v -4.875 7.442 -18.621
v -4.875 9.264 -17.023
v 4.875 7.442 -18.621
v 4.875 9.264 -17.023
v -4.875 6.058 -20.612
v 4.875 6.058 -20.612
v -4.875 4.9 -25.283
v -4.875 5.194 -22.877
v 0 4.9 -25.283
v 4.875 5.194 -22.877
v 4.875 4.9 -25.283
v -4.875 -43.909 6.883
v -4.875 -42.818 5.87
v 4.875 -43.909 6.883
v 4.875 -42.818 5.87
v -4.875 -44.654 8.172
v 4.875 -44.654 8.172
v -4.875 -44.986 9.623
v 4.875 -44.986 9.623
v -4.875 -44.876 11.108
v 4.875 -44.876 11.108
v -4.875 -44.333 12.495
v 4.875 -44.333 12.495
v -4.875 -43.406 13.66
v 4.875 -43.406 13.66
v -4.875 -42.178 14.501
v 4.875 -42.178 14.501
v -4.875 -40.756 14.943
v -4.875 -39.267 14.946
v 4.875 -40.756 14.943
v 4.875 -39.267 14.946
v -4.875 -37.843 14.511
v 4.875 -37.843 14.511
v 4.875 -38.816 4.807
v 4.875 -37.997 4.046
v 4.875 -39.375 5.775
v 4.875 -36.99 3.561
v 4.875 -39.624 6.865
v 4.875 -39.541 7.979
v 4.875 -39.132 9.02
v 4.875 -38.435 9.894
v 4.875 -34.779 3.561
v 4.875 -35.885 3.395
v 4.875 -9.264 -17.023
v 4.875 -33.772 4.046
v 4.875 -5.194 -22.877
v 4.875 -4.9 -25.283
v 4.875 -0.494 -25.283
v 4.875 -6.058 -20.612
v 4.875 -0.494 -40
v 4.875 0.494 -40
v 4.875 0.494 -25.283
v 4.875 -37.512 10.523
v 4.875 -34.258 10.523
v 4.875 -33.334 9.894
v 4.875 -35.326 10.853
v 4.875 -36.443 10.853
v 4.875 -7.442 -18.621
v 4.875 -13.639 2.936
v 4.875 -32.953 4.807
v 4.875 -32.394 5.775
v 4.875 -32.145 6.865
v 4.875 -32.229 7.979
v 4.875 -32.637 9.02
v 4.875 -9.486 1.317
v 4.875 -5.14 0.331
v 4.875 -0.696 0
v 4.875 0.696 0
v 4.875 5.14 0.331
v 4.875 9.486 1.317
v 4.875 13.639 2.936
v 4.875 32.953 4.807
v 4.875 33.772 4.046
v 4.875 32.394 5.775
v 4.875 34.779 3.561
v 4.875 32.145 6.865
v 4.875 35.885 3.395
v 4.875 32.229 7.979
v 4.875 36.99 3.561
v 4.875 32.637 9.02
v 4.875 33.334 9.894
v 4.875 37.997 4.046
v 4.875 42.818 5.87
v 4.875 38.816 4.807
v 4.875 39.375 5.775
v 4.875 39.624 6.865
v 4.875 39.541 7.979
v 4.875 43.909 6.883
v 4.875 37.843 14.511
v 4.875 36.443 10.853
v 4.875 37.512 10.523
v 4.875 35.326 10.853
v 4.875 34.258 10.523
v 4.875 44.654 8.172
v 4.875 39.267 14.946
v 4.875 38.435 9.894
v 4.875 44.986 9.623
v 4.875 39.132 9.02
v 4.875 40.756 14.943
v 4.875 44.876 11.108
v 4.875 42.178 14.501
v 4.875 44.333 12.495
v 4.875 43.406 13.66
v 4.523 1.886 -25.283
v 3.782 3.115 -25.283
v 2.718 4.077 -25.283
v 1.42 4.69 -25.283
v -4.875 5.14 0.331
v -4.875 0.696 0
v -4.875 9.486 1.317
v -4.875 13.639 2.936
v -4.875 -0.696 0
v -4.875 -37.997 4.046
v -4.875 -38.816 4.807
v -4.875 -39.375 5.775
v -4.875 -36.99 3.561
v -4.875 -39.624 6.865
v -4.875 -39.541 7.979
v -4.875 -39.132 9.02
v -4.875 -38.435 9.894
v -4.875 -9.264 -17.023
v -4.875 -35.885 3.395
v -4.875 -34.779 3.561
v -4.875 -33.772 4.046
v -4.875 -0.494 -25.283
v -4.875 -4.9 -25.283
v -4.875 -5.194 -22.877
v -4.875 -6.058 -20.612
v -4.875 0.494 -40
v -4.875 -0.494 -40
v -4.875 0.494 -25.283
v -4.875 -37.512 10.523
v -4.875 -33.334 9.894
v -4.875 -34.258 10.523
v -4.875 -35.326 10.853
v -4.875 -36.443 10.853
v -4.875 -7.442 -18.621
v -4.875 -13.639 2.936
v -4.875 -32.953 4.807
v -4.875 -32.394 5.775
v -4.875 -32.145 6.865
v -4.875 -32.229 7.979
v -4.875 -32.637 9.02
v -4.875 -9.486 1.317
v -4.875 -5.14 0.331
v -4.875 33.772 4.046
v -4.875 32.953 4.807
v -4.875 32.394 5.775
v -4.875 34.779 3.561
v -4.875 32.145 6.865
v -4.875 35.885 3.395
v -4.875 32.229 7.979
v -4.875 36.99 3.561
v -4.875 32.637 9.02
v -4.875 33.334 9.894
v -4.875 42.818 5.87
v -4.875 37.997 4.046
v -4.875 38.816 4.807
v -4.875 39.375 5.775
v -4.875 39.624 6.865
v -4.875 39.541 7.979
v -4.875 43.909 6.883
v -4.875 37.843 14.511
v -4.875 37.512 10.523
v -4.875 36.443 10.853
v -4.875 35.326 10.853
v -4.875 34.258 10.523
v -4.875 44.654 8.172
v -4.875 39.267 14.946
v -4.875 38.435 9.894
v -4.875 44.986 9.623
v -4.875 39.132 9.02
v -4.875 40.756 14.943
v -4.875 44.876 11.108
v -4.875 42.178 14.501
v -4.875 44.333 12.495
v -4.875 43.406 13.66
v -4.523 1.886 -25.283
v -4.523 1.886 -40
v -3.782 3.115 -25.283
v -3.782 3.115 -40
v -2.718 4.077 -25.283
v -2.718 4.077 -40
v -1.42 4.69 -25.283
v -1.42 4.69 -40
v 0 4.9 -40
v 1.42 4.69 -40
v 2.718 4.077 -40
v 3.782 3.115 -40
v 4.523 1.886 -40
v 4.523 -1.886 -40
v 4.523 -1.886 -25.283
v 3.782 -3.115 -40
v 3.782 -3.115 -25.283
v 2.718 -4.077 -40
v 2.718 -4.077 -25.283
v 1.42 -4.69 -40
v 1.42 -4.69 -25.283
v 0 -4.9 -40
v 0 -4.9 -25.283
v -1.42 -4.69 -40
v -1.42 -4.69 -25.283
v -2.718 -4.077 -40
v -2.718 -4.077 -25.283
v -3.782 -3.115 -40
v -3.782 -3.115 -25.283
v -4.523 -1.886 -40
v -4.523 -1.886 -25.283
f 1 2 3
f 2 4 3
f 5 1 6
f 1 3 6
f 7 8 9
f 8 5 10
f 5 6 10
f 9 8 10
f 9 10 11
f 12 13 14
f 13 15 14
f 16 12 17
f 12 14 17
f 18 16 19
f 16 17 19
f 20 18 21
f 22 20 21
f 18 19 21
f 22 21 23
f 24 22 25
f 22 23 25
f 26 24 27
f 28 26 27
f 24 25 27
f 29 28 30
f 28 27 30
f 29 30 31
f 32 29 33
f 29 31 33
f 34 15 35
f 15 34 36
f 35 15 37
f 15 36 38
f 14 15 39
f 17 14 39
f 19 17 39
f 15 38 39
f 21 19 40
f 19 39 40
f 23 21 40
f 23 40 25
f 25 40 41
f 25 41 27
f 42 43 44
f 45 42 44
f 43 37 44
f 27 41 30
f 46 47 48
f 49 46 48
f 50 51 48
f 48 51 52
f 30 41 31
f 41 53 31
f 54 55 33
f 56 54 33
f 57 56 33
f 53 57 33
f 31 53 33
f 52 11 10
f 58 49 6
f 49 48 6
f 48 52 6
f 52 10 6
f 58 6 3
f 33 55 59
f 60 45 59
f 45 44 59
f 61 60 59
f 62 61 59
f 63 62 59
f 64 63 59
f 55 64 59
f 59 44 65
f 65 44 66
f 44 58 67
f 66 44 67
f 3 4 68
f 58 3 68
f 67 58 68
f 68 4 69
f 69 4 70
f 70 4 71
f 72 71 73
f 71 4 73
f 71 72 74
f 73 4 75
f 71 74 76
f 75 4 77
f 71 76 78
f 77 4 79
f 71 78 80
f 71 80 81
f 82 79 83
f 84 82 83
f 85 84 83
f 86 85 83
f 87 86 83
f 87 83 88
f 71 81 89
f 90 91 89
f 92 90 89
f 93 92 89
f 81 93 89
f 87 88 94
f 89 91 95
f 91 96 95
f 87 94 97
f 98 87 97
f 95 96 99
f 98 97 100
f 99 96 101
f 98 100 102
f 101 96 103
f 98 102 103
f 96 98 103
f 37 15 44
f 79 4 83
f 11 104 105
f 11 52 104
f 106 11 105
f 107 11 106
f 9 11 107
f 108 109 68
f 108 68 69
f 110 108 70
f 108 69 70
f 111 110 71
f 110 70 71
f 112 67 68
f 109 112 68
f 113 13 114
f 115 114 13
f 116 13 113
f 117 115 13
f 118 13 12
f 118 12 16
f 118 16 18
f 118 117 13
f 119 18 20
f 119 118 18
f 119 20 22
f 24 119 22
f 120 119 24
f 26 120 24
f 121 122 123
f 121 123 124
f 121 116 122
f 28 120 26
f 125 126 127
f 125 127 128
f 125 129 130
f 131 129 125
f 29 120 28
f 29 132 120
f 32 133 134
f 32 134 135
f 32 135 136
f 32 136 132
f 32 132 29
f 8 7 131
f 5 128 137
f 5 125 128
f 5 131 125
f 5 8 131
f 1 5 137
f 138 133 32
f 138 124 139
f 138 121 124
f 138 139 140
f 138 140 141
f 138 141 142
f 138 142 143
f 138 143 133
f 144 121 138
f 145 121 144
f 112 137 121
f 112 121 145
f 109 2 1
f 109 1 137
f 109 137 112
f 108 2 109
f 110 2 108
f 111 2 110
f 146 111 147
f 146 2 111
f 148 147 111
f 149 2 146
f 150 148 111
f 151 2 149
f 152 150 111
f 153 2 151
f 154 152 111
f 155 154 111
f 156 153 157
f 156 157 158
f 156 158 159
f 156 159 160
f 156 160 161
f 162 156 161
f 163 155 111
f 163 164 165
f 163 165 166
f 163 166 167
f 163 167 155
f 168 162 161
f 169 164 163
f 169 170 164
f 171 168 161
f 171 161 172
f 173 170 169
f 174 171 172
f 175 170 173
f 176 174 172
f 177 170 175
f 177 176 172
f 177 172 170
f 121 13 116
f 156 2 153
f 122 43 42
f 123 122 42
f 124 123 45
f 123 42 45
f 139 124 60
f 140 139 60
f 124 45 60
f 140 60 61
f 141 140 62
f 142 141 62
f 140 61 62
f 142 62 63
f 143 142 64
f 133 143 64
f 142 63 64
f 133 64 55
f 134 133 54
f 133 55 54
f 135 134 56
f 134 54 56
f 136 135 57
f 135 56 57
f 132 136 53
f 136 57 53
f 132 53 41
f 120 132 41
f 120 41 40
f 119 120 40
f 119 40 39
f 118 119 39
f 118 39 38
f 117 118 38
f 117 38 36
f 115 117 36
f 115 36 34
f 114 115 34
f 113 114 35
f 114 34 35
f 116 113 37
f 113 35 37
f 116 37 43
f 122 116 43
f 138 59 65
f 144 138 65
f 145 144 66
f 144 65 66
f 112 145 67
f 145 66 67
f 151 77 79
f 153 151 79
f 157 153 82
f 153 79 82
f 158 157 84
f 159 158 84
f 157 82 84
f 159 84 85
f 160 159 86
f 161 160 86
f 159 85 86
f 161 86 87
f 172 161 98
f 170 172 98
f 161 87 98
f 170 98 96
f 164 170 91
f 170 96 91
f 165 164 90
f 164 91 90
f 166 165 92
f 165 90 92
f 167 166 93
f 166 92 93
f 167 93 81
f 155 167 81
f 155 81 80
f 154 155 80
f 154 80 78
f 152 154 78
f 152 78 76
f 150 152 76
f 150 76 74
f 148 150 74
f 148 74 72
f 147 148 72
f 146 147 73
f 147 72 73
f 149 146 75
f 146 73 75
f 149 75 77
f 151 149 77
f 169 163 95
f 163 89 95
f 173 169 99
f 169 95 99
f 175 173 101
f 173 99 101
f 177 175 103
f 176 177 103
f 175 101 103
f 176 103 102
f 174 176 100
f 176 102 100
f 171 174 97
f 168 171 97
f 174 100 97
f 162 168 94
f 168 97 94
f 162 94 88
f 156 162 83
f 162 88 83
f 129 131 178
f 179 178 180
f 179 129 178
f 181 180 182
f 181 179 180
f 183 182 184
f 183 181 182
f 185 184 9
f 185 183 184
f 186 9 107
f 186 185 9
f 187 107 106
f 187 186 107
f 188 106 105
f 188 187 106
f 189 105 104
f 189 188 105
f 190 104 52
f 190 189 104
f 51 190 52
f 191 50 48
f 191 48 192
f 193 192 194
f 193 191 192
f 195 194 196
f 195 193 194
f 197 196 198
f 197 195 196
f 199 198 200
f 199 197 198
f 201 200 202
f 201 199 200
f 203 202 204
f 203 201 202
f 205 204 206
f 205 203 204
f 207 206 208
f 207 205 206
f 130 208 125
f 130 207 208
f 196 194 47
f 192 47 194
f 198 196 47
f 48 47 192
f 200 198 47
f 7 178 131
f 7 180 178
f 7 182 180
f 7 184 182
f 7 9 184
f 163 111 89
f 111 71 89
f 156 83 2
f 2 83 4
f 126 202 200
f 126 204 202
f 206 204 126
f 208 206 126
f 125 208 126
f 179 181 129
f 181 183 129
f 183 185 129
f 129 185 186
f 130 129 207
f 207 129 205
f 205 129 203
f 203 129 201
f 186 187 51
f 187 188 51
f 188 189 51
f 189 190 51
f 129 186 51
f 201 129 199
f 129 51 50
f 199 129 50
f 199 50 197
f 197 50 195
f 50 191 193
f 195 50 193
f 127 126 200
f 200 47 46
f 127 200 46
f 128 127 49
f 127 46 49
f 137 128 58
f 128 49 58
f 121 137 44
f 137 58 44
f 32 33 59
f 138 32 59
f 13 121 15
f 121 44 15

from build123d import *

# Parameters (mm, degrees)
BOSS_EXTRUDE1_DEPTH = 4.875
SKETCH3_OUTSIDE_W   = 32.934
SKETCH3_OUTSIDE_H   = 113.184
SKETCH3_OUTSIDE_R   = 4.9
CUT_EXTRUDE1_DEPTH  = 14.716884
SKETCH4_R           = 3.75
CUT_EXTRUDE2_DEPTH  = 9.75


with BuildPart() as part:
    # Sketch2 → Boss-Extrude1 (new body, symmetric)
    with BuildSketch(Plane(origin=(0, 0, 0), x_dir=(0, 0, -1), z_dir=(1, 0, 0))):
        with BuildLine():
            Line((0, -0.695639294), (0, 0.695639294))
            ThreePointArc((0, 0.695639294), (-0.743104239, 7.331455024), (-2.93560336, 13.638530568))
            Line((-2.93560336, 13.638530568), (-14.510732773, 37.842851454))
            ThreePointArc((-14.510732773, 37.842851454), (-12.494794947, 44.333127989), (-5.869704015, 42.817916797))
            Line((-5.869704015, 42.817916797), (17.022523842, 9.264166407))
            ThreePointArc((17.022523842, 9.264166407), (20.611838468, 6.058101563), (25.283115813, 4.9))
            Line((25.283115813, 4.9), (40, 4.9))
            Line((40, 4.9), (40, -4.9))
            Line((40, -4.9), (25.283115813, -4.9))
            ThreePointArc((25.283115813, -4.9), (20.611838468, -6.058101563), (17.022523842, -9.264166407))
            Line((17.022523842, -9.264166407), (-5.869704015, -42.817916797))
            ThreePointArc((-5.869704015, -42.817916797), (-12.494794947, -44.333127989), (-14.510732773, -37.842851454))
            Line((-14.510732773, -37.842851454), (-2.93560336, -13.638530568))
            ThreePointArc((-2.93560336, -13.638530568), (-0.743104239, -7.331455024), (0, -0.695639294))
        make_face()
    extrude(amount=BOSS_EXTRUDE1_DEPTH, both=True)

    # Sketch3 outside → Cut-Extrude1 (cut)
    with BuildSketch(Plane(origin=(0, 0, -40), x_dir=(-1, 0, 0), z_dir=(0, 0, -1))):
        Rectangle(SKETCH3_OUTSIDE_W, SKETCH3_OUTSIDE_H)
        Circle(SKETCH3_OUTSIDE_R, mode=Mode.SUBTRACT)
    extrude(amount=-CUT_EXTRUDE1_DEPTH, mode=Mode.SUBTRACT)

    # Sketch4 → Cut-Extrude2 (cut)
    with BuildSketch(Plane(origin=(4.875, 0, 0), x_dir=(0, 0, -1), z_dir=(1, 0, 0))):
        with Locations((-7.144836337, 35.884581199)):
            Circle(SKETCH4_R)
        with Locations((-7.144836337, -35.884581199)):
            Circle(SKETCH4_R)
    extrude(amount=-CUT_EXTRUDE2_DEPTH, mode=Mode.SUBTRACT)


solid = part.part
